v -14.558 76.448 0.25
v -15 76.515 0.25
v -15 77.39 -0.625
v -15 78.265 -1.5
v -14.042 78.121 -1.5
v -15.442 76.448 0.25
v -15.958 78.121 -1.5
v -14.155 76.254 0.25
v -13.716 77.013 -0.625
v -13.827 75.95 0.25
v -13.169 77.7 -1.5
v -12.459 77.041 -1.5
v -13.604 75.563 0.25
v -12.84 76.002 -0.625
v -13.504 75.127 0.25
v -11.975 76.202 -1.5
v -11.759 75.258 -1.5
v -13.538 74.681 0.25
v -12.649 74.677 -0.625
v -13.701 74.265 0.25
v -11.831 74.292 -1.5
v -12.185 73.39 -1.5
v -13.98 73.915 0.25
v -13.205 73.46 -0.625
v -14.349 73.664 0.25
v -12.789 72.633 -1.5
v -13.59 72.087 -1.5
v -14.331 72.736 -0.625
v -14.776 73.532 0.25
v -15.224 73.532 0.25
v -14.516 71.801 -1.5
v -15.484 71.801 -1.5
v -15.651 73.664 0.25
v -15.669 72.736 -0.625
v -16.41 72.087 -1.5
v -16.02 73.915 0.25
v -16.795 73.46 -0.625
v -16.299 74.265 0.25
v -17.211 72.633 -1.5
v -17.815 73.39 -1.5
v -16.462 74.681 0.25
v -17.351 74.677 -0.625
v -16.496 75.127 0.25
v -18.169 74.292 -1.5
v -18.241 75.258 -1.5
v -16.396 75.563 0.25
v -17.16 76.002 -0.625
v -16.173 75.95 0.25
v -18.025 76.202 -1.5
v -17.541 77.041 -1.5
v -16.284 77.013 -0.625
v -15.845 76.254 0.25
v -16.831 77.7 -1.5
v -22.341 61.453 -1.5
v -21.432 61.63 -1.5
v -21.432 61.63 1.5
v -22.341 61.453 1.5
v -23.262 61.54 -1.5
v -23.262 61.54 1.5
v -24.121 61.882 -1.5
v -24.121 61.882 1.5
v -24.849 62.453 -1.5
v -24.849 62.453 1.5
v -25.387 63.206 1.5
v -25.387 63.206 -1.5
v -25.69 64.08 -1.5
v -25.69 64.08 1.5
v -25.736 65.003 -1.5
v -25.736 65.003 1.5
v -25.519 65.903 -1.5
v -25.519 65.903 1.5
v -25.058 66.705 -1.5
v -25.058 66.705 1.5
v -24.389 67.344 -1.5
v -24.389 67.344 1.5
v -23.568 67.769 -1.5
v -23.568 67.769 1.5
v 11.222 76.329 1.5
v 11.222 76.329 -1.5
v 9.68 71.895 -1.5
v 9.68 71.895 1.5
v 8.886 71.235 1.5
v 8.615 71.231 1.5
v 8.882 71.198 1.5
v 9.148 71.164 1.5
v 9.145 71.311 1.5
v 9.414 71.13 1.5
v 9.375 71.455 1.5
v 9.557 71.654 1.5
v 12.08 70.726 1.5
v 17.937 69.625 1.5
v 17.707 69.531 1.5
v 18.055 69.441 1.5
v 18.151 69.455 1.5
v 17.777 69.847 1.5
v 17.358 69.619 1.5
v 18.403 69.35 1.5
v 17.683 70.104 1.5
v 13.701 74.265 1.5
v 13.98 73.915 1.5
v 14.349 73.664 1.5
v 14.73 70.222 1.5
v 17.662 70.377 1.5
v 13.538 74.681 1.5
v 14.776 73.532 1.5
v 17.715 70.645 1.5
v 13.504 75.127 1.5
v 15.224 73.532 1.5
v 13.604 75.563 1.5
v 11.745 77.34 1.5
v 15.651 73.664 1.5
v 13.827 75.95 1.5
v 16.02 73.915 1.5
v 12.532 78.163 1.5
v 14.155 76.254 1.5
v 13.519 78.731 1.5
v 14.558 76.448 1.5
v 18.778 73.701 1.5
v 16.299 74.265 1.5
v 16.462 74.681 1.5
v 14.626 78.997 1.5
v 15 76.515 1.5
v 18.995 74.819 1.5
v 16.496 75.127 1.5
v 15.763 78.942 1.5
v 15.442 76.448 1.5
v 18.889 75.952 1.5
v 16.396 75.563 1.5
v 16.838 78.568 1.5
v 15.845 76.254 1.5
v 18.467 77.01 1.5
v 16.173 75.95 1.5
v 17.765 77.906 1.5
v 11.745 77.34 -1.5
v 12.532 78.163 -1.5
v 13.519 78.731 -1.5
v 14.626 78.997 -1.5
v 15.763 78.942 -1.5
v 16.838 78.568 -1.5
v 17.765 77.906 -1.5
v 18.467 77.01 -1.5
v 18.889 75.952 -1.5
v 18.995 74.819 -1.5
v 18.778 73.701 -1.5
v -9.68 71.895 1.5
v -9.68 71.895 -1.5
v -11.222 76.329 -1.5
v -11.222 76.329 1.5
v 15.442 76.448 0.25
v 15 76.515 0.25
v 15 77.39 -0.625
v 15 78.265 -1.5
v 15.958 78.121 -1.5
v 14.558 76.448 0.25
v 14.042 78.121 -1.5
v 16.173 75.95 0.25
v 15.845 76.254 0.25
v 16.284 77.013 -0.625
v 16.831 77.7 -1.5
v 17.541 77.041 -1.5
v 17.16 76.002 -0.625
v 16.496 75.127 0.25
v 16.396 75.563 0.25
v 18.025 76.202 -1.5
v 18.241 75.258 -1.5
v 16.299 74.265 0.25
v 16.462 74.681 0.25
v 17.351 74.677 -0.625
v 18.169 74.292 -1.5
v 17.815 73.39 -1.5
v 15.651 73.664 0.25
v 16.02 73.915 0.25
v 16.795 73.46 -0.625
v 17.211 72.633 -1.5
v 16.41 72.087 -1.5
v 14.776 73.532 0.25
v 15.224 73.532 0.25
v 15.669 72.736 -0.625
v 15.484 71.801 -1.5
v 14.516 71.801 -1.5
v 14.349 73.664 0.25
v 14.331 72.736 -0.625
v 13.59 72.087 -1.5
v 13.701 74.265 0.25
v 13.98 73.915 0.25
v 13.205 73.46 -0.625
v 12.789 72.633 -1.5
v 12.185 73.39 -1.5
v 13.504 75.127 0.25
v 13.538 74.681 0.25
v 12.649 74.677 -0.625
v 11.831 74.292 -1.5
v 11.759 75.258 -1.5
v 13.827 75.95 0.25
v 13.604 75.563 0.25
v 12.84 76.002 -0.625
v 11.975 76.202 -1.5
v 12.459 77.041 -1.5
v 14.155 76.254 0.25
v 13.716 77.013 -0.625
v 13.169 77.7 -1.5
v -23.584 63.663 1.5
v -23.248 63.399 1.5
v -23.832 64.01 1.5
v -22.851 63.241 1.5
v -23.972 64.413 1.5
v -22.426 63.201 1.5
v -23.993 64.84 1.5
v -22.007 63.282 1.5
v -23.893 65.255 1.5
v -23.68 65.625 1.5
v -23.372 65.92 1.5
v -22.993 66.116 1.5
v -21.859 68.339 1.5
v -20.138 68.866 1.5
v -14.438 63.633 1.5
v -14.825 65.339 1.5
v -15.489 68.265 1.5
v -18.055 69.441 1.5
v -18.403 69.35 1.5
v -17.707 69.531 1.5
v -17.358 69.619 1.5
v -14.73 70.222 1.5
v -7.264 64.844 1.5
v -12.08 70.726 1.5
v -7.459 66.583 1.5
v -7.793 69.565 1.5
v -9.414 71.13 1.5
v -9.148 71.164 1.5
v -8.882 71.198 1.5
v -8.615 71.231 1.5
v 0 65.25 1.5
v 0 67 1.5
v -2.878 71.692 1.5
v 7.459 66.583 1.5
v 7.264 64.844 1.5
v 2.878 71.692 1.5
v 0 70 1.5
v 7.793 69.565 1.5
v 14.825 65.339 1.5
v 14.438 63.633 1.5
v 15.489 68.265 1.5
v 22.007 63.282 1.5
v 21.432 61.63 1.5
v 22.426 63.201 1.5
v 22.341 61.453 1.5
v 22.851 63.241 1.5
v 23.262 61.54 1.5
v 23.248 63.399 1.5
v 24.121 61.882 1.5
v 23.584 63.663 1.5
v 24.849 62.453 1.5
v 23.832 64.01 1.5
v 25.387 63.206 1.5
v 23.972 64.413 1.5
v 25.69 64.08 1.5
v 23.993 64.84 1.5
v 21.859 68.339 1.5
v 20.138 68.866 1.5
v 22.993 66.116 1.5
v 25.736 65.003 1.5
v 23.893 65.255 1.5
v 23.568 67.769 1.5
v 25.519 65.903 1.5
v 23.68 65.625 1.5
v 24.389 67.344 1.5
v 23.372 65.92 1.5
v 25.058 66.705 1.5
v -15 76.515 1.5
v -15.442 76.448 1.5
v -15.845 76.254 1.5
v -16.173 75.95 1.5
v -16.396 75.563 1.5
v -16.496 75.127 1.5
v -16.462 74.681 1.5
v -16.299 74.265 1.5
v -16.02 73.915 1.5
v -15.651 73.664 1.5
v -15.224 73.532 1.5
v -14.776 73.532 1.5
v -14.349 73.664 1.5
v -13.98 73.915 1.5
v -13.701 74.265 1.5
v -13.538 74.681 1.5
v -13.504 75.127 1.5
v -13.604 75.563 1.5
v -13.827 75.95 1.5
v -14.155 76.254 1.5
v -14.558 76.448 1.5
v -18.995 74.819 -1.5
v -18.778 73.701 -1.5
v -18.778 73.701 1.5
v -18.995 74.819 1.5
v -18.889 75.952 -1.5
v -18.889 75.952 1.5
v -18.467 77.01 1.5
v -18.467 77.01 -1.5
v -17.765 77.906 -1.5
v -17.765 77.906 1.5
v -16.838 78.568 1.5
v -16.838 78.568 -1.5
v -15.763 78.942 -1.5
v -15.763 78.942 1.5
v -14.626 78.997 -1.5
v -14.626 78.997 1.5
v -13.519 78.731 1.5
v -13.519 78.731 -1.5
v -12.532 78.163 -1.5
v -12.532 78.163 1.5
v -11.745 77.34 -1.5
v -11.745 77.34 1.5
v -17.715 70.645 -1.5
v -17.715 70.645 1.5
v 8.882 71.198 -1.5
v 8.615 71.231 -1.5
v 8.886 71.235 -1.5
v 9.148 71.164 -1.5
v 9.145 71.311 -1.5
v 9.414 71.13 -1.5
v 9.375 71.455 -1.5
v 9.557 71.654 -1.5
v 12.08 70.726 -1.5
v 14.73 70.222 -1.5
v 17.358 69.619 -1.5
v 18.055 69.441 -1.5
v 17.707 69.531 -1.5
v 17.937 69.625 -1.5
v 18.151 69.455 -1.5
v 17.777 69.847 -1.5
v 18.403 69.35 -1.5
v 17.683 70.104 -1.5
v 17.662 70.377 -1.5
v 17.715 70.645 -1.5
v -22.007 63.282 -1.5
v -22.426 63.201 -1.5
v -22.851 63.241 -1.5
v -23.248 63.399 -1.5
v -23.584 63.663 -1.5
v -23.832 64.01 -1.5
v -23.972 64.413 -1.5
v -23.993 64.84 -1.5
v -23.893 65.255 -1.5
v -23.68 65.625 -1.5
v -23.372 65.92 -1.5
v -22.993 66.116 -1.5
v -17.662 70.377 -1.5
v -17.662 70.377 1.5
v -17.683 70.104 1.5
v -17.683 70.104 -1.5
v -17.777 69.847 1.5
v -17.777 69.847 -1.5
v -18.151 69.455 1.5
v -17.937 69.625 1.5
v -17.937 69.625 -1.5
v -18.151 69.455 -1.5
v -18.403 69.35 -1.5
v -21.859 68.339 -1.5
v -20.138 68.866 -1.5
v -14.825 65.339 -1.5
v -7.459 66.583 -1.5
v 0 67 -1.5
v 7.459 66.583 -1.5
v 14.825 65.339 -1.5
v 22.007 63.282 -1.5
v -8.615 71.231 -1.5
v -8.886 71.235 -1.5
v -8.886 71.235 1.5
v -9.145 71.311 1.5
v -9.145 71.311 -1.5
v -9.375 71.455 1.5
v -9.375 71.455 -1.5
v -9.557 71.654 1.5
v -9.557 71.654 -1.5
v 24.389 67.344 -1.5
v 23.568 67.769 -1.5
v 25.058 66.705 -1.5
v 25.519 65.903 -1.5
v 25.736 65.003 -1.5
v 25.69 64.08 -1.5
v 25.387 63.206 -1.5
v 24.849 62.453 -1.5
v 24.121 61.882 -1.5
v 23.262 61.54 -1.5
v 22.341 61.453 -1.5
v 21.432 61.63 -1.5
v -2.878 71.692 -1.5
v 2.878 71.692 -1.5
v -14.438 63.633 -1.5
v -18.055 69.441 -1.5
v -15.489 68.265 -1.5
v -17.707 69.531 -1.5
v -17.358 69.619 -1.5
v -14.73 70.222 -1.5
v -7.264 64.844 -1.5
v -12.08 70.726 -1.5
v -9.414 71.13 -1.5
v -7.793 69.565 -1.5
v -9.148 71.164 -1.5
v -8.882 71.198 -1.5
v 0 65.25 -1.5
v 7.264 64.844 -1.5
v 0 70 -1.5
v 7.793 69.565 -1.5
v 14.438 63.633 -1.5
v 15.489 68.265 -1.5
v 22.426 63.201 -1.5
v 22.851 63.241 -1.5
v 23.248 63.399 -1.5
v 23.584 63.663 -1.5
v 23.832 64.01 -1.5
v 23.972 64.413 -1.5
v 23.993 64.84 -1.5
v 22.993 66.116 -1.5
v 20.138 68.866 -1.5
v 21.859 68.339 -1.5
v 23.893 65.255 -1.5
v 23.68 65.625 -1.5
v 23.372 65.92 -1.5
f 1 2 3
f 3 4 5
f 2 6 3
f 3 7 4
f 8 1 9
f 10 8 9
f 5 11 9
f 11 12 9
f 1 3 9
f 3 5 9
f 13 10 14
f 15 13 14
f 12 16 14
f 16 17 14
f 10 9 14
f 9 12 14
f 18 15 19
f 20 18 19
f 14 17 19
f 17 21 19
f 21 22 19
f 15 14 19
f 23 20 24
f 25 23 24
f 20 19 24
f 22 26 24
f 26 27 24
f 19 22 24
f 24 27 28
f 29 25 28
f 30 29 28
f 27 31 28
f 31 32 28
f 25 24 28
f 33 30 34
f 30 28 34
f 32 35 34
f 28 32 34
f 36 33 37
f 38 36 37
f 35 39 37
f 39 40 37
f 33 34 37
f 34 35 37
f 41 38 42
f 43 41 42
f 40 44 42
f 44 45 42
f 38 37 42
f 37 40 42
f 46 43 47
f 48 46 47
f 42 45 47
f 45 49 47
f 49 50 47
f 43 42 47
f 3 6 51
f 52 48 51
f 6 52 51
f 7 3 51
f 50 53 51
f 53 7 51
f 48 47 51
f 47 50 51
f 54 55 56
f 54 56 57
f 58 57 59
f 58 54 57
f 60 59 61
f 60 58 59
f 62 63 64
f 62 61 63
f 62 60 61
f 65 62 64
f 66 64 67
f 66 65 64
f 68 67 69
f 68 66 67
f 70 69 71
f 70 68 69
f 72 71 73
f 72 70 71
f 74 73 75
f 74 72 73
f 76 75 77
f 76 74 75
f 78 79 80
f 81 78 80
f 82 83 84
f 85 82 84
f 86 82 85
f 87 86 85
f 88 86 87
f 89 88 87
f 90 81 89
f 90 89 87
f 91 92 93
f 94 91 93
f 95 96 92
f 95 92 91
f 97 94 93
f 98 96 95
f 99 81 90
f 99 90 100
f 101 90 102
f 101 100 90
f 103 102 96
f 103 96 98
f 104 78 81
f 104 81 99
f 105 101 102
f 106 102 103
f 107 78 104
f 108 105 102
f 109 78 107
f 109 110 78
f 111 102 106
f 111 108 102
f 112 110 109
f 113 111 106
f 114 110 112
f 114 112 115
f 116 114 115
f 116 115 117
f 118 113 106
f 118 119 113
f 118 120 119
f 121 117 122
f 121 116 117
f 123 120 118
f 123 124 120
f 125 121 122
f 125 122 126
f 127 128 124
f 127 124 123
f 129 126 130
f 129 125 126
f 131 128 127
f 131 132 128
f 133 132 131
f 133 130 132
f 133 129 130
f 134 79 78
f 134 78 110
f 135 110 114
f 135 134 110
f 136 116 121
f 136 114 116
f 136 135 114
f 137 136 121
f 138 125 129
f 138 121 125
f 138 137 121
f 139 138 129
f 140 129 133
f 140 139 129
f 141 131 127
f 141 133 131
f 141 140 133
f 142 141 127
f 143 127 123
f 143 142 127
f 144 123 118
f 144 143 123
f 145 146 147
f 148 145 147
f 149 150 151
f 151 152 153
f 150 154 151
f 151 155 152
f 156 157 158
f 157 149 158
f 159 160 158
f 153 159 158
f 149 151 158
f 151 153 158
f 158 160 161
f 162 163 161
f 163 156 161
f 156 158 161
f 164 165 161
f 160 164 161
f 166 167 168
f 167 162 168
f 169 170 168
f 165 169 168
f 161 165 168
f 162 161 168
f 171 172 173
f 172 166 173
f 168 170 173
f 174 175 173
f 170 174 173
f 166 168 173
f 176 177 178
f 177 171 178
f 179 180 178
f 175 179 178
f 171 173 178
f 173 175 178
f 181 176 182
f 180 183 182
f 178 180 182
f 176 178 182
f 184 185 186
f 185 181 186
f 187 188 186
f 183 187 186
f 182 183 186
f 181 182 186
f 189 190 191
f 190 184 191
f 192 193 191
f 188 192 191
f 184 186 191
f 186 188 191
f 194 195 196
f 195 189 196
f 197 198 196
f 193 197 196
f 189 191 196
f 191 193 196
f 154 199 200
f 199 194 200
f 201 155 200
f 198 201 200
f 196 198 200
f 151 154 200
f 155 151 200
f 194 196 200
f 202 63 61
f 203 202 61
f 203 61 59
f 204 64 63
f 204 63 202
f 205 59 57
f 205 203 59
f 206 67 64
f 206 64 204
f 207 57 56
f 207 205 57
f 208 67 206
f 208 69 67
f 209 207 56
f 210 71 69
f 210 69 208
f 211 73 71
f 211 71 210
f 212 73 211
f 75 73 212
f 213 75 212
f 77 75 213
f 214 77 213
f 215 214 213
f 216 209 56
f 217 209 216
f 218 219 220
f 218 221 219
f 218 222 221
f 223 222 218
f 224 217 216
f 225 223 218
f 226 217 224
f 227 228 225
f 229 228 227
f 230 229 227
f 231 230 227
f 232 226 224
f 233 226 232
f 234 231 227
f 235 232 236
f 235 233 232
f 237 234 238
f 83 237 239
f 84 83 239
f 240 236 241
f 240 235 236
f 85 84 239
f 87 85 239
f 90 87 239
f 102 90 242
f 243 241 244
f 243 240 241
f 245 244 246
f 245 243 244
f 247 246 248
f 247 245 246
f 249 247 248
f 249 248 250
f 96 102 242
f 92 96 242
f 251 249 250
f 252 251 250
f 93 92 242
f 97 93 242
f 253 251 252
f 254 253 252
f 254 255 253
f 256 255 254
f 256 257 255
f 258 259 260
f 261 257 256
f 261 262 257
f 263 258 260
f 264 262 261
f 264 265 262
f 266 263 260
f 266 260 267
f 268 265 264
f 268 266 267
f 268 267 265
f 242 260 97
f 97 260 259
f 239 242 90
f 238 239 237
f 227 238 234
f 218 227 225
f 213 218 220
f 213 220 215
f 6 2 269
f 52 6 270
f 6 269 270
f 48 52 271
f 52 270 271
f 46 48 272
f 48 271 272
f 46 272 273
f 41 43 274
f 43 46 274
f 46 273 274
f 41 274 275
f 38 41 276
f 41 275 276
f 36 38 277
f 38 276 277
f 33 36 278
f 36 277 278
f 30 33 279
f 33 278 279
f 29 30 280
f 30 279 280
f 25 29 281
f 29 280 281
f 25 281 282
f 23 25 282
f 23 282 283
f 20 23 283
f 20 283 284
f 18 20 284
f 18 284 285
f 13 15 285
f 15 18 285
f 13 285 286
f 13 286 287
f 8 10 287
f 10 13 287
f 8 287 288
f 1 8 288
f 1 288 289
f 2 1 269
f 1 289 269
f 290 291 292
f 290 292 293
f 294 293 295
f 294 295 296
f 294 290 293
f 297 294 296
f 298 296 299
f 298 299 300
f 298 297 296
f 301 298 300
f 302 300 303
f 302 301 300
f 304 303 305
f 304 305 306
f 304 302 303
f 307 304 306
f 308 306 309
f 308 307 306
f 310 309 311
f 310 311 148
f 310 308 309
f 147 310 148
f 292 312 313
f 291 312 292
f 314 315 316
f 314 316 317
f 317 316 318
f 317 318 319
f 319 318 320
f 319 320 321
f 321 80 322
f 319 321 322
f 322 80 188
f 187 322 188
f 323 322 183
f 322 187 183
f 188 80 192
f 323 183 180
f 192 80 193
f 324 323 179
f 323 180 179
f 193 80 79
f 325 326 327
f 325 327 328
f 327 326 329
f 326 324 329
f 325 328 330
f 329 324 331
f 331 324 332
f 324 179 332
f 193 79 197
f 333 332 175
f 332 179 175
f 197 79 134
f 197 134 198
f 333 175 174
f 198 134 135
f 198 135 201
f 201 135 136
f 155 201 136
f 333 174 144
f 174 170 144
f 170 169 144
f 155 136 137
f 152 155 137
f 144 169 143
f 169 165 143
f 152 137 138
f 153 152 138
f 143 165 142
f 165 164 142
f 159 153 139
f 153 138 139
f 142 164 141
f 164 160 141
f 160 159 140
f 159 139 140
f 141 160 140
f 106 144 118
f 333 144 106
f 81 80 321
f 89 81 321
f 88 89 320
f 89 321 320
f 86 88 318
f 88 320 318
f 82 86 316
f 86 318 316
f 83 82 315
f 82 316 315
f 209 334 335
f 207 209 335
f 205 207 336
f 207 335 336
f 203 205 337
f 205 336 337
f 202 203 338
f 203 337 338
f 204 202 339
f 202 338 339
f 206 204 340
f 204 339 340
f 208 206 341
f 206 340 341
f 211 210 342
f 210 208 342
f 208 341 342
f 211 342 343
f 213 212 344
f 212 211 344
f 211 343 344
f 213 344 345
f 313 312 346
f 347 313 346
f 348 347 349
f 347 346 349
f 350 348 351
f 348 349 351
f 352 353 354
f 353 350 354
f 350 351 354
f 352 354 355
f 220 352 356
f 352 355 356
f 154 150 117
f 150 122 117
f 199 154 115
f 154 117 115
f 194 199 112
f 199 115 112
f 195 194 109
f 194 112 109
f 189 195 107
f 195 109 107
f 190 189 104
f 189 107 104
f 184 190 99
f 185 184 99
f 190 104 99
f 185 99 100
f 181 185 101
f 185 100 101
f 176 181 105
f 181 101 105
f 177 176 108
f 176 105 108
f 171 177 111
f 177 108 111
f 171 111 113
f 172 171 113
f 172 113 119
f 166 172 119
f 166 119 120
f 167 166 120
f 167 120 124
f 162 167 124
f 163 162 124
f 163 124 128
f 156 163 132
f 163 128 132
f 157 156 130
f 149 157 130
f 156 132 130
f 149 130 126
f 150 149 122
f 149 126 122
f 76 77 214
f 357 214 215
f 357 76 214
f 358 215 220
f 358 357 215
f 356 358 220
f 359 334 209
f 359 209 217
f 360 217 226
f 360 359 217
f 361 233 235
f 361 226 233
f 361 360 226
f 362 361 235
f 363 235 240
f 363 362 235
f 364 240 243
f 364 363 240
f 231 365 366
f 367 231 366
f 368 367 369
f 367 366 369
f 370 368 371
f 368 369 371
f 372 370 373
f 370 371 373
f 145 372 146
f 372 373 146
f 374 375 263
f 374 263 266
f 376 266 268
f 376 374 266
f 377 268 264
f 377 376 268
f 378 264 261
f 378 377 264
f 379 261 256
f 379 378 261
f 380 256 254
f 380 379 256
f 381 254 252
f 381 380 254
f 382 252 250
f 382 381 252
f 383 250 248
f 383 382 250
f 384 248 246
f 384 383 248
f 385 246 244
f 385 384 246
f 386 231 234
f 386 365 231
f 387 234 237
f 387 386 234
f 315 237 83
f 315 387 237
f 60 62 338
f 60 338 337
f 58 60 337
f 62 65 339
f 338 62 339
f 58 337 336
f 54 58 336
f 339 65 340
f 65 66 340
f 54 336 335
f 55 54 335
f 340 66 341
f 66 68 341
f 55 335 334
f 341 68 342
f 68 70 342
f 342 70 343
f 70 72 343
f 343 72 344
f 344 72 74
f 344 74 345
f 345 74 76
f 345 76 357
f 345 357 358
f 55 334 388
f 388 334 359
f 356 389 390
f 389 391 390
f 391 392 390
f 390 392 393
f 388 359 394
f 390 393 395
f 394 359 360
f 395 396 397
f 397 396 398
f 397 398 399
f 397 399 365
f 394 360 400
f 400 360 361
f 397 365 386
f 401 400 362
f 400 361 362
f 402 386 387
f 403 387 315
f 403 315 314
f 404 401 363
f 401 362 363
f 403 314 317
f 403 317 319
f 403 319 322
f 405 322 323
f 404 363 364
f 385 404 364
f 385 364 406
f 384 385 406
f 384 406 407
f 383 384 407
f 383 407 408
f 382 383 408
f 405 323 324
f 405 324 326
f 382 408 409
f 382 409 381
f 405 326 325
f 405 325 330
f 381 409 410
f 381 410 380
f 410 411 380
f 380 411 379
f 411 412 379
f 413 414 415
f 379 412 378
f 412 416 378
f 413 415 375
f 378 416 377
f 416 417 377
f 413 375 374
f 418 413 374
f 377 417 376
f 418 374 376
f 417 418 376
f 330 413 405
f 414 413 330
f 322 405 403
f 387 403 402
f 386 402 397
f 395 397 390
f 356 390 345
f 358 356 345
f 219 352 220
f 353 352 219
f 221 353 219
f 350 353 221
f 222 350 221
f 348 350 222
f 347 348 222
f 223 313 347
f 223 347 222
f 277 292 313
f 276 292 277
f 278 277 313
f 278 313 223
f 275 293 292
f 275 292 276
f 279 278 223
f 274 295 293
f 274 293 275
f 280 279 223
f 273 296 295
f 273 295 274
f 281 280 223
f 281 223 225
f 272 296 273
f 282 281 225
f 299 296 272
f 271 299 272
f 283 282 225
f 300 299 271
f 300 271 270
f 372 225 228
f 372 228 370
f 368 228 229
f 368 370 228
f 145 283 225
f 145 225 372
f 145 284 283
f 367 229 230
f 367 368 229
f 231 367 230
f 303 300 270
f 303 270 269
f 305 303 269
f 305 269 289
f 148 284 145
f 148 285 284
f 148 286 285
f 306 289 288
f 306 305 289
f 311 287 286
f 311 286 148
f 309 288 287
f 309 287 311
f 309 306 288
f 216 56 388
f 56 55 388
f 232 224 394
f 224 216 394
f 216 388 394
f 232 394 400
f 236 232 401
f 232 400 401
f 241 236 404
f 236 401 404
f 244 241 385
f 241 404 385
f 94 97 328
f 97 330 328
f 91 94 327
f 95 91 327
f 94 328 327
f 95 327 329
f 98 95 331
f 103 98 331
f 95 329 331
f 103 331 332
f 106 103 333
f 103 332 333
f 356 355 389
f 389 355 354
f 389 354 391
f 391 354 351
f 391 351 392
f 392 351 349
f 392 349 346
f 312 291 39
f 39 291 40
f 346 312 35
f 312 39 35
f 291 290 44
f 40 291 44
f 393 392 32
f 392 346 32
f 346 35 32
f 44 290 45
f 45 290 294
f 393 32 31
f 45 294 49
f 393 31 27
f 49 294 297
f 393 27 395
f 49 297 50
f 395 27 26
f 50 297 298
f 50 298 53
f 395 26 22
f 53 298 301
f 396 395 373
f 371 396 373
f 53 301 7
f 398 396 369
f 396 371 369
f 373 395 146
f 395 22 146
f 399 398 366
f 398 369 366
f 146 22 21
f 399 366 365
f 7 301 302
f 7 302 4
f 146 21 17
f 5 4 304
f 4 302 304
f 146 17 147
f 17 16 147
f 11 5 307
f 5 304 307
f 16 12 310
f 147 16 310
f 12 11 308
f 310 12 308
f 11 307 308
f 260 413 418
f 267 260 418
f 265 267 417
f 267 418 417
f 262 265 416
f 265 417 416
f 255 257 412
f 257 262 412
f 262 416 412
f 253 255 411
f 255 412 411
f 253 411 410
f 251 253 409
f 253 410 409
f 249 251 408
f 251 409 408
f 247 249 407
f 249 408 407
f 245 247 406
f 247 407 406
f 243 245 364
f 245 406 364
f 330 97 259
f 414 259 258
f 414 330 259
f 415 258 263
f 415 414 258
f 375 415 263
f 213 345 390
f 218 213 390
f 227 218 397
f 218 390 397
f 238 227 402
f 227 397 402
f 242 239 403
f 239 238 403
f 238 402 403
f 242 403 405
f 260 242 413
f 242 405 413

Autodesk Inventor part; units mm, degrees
ref_plane "YZ Plane" through (0, 0, 0) normal (1, 0, 0) x (0, 1, 0)
ref_plane "XZ Plane" through (0, 0, 0) normal (0, 1, 0) x (-1, 0, 0)
ref_plane "XY Plane" through (0, 0, 0) normal (0, 0, 1) x (1, 0, 0)
sketch "Sketch3" plane through (0, 0, 0) normal (0, 0, 1) x (1, 0, 0)
  line L0 (18.7781, 73.7011) -> (17.3583, 69.6186)
  line L1 (22.5, 64.6993) -> (23.5675, 67.769) construction
  line L2 (11.2219, 76.3289) -> (9.4139, 71.1298)
  arc A0 (22.0073, 63.2825) -> (22.9927, 66.1161) centre (22.5, 64.6993) ccw
  circle A1 centre (22.5, 64.6993) radius 1.5 construction
  arc A2 (21.4325, 61.6296) -> (23.5675, 67.769) centre (22.5, 64.6993) ccw
  arc A3 (21.4325, 61.6296) -> (-21.4325, 61.6296) centre (0, 0) ccw
  arc A4 (22.0073, 63.2825) -> (-22.0073, 63.2825) centre (0, 0) ccw
  arc A5 (22.5, 64.6993) -> (-22.5, 64.6993) centre (0, 0) ccw construction
  arc A6 (23.5675, 67.769) -> (-23.5675, 67.769) centre (0, 0) ccw
  circle A7 centre (0, 0) radius 76.5 construction
  circle A8 centre (0, 0) radius 68.5 construction
  arc A9 (22.9927, 66.1161) -> (-22.9927, 66.1161) centre (0, 0) ccw
  circle A10 centre (-22.5, 64.6993) radius 1.5 construction
  arc A11 (-22.9927, 66.1161) -> (-22.0073, 63.2825) centre (-22.5, 64.6993) ccw
  arc A12 (-23.5675, 67.769) -> (-21.4325, 61.6296) centre (-22.5, 64.6993) ccw
  arc A13 (18.7781, 73.7011) -> (11.2219, 76.3289) centre (15, 75.015) ccw
  dimension "d32" = 153
  dimension "d33" = 8
  dimension "d34" = 3.25
  dimension "d35" = 45
  dimension "d36" = 22.5
  dimension "d37" = 3
  dimension "d38" = 8
  dimension "d39" = 15
  dimension "d40" = 0
  dimension "d41" = 71.75
extrude "Extrusion4" add sketch "Sketch3" along normal mid plane 3 contours A6 A2 A3 A12
extrude "Extrusion5" add sketch "Sketch3" along normal mid plane 3 contours L0 A6 L2 A13
sketch "Sketch5" plane through (0, 0, -1.5) normal (0, 0, -1) x (-1, 0, 0)
  circle A0 centre (-15, 75.015) radius 1.5
  arc A1 (-11.2219, 76.3289) -> (-18.7781, 73.7011) centre (-15, 75.015) ccw
  line L0 (-18.7781, 73.7011) -> (-17.3583, 69.6186)
  point P0 (0, 0)
  point P1 (0, 0)
  dimension "d46" = 3
  dimension "d47" = 0
  dimension "d48" = 4
hole "Hole1" at (15, 75.015, -1.5) direction (0, 0, 1) diameter 3 end through all countersink diameter 6.5 countersink angle 90
mirror "Mirror1" about plane through (0, 0, 0) normal (1, 0, 0) of "Hole1", "Extrusion5"
fillet "Fillet1" radius 1 4 edges at (-17.3583, 69.6186, 0) (-9.4139, 71.1298, 0) (17.3583, 69.6186, 0) (9.4139, 71.1298, 0)
sketch "Sketch6" plane through (0, 0, 1.5) normal (0, 0, 1) x (1, 0, 0)
  point P0 (0, 0)
properties part number "reverse gear gear link"
